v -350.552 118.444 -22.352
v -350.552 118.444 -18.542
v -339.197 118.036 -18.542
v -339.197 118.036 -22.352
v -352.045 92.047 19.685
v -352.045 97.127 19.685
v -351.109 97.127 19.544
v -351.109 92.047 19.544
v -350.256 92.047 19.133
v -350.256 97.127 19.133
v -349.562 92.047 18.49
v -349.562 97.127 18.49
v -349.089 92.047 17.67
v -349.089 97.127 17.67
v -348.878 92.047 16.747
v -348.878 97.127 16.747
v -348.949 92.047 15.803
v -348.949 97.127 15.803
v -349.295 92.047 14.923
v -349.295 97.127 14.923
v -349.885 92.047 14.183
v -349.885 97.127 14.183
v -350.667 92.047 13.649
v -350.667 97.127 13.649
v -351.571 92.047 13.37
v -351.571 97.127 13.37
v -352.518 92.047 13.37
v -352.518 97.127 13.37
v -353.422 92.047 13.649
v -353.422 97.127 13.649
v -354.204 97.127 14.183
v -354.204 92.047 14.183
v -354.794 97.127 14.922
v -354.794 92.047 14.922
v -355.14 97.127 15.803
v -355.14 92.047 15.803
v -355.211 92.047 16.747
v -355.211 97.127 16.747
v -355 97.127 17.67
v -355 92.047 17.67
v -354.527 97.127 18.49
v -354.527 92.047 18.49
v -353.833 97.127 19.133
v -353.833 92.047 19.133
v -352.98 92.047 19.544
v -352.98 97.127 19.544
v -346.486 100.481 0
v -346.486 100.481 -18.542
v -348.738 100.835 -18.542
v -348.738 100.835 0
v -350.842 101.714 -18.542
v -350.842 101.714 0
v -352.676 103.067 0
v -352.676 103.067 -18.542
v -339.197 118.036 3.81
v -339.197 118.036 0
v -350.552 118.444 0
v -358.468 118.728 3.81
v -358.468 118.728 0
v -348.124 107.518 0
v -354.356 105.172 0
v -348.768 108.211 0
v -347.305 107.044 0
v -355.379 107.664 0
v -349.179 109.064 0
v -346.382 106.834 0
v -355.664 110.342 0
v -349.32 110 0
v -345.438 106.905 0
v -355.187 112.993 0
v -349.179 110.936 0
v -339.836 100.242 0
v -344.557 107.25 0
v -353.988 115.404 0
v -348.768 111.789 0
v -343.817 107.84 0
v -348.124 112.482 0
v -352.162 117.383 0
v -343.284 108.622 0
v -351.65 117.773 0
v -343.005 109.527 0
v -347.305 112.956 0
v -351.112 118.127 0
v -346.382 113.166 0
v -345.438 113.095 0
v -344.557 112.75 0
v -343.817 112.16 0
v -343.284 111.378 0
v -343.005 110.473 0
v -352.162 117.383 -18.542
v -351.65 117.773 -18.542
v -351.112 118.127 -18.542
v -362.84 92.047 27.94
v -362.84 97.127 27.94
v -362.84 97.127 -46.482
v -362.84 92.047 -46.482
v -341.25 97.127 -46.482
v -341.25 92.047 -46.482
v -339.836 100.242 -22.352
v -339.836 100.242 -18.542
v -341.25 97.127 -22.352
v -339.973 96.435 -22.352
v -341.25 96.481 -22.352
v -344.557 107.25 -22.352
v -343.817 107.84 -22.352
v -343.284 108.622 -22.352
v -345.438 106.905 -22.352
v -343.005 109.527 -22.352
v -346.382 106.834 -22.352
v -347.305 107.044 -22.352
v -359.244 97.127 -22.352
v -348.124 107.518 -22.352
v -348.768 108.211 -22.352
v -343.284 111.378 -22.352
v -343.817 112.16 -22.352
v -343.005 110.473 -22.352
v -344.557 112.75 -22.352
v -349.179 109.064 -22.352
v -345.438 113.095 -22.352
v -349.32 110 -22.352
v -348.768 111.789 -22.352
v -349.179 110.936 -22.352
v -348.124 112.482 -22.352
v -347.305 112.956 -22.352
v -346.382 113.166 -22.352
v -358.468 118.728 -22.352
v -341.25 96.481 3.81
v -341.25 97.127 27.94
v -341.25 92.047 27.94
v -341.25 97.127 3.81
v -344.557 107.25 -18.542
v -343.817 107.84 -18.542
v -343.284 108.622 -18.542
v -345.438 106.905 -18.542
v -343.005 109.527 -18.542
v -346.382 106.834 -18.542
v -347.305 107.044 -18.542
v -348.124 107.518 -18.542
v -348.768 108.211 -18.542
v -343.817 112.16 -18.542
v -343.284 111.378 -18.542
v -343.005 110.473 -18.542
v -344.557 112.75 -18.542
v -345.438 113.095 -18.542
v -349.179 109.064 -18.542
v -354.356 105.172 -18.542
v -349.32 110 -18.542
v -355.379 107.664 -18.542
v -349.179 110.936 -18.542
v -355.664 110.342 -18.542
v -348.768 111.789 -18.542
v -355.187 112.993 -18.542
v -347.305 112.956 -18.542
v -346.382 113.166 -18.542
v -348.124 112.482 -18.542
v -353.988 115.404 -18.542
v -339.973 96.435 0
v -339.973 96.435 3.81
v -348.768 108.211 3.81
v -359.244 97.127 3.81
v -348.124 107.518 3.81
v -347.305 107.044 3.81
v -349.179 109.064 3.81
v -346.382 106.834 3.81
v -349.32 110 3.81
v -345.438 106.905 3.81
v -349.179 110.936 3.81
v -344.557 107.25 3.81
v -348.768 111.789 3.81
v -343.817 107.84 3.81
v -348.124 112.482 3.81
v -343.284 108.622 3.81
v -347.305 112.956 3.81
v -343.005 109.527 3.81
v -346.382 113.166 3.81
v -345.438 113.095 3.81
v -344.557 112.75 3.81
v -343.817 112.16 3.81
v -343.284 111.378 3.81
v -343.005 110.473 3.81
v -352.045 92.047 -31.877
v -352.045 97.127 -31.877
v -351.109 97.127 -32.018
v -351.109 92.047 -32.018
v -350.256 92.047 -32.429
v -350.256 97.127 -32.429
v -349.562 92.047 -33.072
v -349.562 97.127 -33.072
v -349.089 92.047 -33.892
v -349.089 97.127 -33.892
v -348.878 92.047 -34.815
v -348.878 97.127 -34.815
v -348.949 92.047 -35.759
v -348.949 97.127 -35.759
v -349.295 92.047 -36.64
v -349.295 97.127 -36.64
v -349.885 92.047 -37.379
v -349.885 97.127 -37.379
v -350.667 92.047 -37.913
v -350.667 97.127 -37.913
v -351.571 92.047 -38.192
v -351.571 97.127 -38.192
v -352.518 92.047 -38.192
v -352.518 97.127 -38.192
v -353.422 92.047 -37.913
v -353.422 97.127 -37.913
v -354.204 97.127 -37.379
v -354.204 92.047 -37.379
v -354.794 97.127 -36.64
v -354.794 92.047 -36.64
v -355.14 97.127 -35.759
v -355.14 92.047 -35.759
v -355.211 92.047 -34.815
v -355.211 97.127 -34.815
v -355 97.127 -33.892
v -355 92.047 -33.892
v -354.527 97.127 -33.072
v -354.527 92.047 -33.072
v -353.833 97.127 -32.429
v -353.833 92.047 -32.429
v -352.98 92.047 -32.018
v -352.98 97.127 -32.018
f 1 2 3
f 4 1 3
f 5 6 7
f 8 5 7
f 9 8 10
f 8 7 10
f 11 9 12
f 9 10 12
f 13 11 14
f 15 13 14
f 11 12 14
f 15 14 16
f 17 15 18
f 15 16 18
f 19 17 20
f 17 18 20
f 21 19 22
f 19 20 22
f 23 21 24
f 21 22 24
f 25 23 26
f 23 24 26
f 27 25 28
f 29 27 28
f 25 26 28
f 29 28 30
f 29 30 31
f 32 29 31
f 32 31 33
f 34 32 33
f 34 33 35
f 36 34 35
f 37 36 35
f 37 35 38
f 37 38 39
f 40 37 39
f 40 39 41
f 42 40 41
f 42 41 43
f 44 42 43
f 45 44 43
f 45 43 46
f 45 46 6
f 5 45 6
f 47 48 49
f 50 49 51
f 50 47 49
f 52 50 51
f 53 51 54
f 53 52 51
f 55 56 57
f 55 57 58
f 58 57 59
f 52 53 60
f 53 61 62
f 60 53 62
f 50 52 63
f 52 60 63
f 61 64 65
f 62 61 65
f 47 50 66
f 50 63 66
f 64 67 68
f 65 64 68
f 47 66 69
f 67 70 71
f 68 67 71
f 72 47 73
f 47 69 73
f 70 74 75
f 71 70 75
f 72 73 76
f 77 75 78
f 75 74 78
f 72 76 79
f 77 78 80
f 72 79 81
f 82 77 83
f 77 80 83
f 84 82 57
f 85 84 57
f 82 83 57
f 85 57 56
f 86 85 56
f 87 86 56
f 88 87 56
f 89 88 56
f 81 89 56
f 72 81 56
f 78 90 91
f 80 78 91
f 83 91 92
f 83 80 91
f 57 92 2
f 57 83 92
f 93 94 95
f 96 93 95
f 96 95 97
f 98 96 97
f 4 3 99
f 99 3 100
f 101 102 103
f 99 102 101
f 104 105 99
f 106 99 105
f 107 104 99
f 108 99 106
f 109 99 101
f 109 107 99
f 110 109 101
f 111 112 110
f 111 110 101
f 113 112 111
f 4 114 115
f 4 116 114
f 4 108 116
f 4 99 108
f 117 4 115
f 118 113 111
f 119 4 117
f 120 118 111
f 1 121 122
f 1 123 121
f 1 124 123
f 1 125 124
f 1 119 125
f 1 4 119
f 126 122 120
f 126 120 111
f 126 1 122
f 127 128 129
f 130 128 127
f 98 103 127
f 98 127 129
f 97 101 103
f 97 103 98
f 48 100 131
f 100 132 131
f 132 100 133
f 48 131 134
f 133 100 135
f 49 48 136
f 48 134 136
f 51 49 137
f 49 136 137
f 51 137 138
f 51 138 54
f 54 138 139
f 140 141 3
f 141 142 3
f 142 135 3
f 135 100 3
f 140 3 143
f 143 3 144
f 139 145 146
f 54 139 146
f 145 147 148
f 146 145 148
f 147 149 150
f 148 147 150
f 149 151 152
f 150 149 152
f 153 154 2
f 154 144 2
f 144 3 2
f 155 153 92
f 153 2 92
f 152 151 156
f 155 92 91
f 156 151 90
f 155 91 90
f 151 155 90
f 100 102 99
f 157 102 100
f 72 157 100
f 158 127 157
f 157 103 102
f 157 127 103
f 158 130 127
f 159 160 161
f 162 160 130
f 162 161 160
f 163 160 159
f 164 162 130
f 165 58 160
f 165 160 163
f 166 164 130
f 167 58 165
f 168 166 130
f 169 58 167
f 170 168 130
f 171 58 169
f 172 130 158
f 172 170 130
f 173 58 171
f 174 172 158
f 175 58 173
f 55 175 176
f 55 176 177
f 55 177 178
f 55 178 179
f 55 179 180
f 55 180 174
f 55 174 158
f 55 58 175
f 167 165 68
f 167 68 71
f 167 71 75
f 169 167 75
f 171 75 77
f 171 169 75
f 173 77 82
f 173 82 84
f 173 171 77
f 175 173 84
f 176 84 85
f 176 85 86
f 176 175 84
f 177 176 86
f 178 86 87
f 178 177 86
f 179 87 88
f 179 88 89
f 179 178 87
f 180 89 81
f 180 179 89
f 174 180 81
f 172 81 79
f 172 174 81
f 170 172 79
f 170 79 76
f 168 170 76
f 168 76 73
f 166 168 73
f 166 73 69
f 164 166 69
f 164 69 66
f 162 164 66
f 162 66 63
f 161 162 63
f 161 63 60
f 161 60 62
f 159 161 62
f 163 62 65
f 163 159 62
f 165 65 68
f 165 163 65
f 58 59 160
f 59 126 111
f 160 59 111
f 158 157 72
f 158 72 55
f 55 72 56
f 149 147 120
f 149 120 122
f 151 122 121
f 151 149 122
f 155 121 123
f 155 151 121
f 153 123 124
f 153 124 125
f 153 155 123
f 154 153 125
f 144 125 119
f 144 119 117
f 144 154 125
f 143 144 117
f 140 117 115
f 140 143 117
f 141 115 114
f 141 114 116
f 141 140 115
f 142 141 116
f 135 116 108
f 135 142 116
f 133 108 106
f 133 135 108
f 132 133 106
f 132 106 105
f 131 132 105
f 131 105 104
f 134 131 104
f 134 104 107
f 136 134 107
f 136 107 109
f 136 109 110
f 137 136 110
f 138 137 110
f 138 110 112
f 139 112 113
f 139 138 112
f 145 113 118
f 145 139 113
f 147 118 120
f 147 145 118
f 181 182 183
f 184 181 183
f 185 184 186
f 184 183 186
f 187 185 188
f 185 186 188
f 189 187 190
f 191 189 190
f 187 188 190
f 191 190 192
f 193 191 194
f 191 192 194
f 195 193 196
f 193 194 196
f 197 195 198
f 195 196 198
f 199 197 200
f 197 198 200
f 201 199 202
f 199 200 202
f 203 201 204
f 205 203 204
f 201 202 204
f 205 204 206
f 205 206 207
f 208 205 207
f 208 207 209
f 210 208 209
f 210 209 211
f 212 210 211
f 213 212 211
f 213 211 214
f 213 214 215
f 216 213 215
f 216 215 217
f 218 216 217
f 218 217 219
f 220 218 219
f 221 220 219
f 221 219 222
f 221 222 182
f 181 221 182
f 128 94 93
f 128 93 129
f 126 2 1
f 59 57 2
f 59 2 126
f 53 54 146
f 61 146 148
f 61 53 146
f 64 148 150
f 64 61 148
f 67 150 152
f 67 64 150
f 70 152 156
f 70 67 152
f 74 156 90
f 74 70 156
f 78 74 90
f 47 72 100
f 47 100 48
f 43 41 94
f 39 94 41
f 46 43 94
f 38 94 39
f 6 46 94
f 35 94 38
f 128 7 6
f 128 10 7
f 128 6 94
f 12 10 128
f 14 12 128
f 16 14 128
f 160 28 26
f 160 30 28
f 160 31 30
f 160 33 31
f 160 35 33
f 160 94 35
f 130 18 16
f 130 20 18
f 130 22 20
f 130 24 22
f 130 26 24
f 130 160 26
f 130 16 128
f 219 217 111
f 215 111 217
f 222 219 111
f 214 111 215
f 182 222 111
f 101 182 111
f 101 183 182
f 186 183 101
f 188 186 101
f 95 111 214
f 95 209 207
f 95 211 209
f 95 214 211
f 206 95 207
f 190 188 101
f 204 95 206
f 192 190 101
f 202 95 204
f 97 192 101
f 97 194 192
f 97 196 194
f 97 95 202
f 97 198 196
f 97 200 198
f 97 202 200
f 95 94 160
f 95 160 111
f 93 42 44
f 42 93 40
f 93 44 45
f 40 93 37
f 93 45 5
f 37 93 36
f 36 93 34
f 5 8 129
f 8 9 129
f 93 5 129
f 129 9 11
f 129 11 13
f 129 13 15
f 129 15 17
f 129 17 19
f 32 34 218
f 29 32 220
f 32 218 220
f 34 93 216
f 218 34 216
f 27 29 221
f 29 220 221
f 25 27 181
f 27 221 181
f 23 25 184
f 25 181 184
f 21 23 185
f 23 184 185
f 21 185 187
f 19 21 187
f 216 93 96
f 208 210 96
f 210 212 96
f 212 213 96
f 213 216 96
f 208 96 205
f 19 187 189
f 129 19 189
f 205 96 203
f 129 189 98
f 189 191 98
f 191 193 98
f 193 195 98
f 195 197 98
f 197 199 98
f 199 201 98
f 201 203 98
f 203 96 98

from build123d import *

# Parameters (mm, degrees)
BOSS_EXTRUDE1_DEPTH = 22.352
BOSS_EXTRUDE3_START = -3.81
SKETCH2_R           = 3.175
BOSS_EXTRUDE3_DEPTH = 3.81
BOSS_EXTRUDE4_DEPTH = 3.81
CUT_EXTRUDE1_START  = -3.81
SKETCH6_R           = 3.175
CUT_EXTRUDE1_DEPTH  = 3.81
SKETCH7_W           = 21.59
SKETCH7_H           = 74.422
BOSS_EXTRUDE6_DEPTH = 5.08
SKETCH9_R           = 3.175
CUT_EXTRUDE2_DEPTH  = 6.35


with BuildPart() as part:
    # Sketch1 → Boss-Extrude1 (new body)
    with BuildSketch(Plane.XY):
        with BuildLine():
            ThreePointArc((-352.162161707, 117.383467749), (-351.384007065, 117.9545664), (-350.552048848, 118.44397813))
            Line((-350.552048848, 118.44397813), (-358.467972096, 118.728192663))
            Line((-358.467972096, 118.728192663), (-359.243555017, 97.126711503))
            Line((-359.243555017, 97.126711503), (-339.97264358, 96.434805718))
            Line((-339.97264358, 96.434805718), (-339.835936837, 100.242352338))
            Line((-339.835936837, 100.242352338), (-346.486451601, 100.481133449))
            ThreePointArc((-346.486451601, 100.481133449), (-349.816499797, 101.211177598), (-352.67617906, 103.067092457))
            ThreePointArc((-352.67617906, 103.067092457), (-355.663551295, 110.341766857), (-352.162161707, 117.383467749))
        make_face()
    extrude(amount=-BOSS_EXTRUDE1_DEPTH)

    # Sketch2 → Boss-Extrude3 (add)
    with BuildSketch(Plane(origin=(0, 0, -22.352), x_dir=(-1, 0, 0), z_dir=(0, 0, -1)).offset(BOSS_EXTRUDE3_START)):
        with BuildLine():
            ThreePointArc((346.486451601, 100.481133449), (355.434706729, 107.897354875), (350.552048848, 118.44397813))
            Line((350.552048848, 118.44397813), (339.197060659, 118.036286878))
            Line((339.197060659, 118.036286878), (339.835936837, 100.242352338))
            Line((339.835936837, 100.242352338), (346.486451601, 100.481133449))
        make_face()
        with Locations((346.144684744, 110)):
            Circle(SKETCH2_R, mode=Mode.SUBTRACT)
    extrude(amount=BOSS_EXTRUDE3_DEPTH)

    # Sketch3 → Boss-Extrude4 (add)
    with BuildSketch(Plane.XY):
        Polygon((-358.467972096, 118.728192663), (-359.243555017, 97.126711503), (-339.97264358, 96.434805718), (-339.197060659, 118.036286878), align=None)
    extrude(amount=BOSS_EXTRUDE4_DEPTH)

    # Sketch6 → Cut-Extrude1 (cut)
    with BuildSketch(Plane(origin=(0, 0, 0), x_dir=(-1, 0, 0), z_dir=(0, 0, -1)).offset(CUT_EXTRUDE1_START)):
        with Locations((346.144684744, 110)):
            Circle(SKETCH6_R)
    extrude(amount=CUT_EXTRUDE1_DEPTH, mode=Mode.SUBTRACT)

    # Sketch7 → Boss-Extrude6 (add)
    with BuildSketch(Plane(origin=(0, 97.126711503, 0), x_dir=(1, 0, 0), z_dir=(0, 1, 0))):
        with Locations((-352.044558269, 9.271)):
            Rectangle(SKETCH7_W, SKETCH7_H)
    extrude(amount=-BOSS_EXTRUDE6_DEPTH)

    # Sketch9 → Cut-Extrude2 (cut)
    with BuildSketch(Plane(origin=(0, 97.126711503, 0), x_dir=(1, 0, 0), z_dir=(0, 1, 0))):
        with Locations(Location((-352.044558269, -16.51, 0), (0, 0, 270))):
            Circle(SKETCH9_R)
        with Locations(Location((-352.044558269, 35.052, 0), (0, 0, 270))):
            Circle(SKETCH9_R)
    extrude(amount=-CUT_EXTRUDE2_DEPTH, mode=Mode.SUBTRACT)


solid = part.part
